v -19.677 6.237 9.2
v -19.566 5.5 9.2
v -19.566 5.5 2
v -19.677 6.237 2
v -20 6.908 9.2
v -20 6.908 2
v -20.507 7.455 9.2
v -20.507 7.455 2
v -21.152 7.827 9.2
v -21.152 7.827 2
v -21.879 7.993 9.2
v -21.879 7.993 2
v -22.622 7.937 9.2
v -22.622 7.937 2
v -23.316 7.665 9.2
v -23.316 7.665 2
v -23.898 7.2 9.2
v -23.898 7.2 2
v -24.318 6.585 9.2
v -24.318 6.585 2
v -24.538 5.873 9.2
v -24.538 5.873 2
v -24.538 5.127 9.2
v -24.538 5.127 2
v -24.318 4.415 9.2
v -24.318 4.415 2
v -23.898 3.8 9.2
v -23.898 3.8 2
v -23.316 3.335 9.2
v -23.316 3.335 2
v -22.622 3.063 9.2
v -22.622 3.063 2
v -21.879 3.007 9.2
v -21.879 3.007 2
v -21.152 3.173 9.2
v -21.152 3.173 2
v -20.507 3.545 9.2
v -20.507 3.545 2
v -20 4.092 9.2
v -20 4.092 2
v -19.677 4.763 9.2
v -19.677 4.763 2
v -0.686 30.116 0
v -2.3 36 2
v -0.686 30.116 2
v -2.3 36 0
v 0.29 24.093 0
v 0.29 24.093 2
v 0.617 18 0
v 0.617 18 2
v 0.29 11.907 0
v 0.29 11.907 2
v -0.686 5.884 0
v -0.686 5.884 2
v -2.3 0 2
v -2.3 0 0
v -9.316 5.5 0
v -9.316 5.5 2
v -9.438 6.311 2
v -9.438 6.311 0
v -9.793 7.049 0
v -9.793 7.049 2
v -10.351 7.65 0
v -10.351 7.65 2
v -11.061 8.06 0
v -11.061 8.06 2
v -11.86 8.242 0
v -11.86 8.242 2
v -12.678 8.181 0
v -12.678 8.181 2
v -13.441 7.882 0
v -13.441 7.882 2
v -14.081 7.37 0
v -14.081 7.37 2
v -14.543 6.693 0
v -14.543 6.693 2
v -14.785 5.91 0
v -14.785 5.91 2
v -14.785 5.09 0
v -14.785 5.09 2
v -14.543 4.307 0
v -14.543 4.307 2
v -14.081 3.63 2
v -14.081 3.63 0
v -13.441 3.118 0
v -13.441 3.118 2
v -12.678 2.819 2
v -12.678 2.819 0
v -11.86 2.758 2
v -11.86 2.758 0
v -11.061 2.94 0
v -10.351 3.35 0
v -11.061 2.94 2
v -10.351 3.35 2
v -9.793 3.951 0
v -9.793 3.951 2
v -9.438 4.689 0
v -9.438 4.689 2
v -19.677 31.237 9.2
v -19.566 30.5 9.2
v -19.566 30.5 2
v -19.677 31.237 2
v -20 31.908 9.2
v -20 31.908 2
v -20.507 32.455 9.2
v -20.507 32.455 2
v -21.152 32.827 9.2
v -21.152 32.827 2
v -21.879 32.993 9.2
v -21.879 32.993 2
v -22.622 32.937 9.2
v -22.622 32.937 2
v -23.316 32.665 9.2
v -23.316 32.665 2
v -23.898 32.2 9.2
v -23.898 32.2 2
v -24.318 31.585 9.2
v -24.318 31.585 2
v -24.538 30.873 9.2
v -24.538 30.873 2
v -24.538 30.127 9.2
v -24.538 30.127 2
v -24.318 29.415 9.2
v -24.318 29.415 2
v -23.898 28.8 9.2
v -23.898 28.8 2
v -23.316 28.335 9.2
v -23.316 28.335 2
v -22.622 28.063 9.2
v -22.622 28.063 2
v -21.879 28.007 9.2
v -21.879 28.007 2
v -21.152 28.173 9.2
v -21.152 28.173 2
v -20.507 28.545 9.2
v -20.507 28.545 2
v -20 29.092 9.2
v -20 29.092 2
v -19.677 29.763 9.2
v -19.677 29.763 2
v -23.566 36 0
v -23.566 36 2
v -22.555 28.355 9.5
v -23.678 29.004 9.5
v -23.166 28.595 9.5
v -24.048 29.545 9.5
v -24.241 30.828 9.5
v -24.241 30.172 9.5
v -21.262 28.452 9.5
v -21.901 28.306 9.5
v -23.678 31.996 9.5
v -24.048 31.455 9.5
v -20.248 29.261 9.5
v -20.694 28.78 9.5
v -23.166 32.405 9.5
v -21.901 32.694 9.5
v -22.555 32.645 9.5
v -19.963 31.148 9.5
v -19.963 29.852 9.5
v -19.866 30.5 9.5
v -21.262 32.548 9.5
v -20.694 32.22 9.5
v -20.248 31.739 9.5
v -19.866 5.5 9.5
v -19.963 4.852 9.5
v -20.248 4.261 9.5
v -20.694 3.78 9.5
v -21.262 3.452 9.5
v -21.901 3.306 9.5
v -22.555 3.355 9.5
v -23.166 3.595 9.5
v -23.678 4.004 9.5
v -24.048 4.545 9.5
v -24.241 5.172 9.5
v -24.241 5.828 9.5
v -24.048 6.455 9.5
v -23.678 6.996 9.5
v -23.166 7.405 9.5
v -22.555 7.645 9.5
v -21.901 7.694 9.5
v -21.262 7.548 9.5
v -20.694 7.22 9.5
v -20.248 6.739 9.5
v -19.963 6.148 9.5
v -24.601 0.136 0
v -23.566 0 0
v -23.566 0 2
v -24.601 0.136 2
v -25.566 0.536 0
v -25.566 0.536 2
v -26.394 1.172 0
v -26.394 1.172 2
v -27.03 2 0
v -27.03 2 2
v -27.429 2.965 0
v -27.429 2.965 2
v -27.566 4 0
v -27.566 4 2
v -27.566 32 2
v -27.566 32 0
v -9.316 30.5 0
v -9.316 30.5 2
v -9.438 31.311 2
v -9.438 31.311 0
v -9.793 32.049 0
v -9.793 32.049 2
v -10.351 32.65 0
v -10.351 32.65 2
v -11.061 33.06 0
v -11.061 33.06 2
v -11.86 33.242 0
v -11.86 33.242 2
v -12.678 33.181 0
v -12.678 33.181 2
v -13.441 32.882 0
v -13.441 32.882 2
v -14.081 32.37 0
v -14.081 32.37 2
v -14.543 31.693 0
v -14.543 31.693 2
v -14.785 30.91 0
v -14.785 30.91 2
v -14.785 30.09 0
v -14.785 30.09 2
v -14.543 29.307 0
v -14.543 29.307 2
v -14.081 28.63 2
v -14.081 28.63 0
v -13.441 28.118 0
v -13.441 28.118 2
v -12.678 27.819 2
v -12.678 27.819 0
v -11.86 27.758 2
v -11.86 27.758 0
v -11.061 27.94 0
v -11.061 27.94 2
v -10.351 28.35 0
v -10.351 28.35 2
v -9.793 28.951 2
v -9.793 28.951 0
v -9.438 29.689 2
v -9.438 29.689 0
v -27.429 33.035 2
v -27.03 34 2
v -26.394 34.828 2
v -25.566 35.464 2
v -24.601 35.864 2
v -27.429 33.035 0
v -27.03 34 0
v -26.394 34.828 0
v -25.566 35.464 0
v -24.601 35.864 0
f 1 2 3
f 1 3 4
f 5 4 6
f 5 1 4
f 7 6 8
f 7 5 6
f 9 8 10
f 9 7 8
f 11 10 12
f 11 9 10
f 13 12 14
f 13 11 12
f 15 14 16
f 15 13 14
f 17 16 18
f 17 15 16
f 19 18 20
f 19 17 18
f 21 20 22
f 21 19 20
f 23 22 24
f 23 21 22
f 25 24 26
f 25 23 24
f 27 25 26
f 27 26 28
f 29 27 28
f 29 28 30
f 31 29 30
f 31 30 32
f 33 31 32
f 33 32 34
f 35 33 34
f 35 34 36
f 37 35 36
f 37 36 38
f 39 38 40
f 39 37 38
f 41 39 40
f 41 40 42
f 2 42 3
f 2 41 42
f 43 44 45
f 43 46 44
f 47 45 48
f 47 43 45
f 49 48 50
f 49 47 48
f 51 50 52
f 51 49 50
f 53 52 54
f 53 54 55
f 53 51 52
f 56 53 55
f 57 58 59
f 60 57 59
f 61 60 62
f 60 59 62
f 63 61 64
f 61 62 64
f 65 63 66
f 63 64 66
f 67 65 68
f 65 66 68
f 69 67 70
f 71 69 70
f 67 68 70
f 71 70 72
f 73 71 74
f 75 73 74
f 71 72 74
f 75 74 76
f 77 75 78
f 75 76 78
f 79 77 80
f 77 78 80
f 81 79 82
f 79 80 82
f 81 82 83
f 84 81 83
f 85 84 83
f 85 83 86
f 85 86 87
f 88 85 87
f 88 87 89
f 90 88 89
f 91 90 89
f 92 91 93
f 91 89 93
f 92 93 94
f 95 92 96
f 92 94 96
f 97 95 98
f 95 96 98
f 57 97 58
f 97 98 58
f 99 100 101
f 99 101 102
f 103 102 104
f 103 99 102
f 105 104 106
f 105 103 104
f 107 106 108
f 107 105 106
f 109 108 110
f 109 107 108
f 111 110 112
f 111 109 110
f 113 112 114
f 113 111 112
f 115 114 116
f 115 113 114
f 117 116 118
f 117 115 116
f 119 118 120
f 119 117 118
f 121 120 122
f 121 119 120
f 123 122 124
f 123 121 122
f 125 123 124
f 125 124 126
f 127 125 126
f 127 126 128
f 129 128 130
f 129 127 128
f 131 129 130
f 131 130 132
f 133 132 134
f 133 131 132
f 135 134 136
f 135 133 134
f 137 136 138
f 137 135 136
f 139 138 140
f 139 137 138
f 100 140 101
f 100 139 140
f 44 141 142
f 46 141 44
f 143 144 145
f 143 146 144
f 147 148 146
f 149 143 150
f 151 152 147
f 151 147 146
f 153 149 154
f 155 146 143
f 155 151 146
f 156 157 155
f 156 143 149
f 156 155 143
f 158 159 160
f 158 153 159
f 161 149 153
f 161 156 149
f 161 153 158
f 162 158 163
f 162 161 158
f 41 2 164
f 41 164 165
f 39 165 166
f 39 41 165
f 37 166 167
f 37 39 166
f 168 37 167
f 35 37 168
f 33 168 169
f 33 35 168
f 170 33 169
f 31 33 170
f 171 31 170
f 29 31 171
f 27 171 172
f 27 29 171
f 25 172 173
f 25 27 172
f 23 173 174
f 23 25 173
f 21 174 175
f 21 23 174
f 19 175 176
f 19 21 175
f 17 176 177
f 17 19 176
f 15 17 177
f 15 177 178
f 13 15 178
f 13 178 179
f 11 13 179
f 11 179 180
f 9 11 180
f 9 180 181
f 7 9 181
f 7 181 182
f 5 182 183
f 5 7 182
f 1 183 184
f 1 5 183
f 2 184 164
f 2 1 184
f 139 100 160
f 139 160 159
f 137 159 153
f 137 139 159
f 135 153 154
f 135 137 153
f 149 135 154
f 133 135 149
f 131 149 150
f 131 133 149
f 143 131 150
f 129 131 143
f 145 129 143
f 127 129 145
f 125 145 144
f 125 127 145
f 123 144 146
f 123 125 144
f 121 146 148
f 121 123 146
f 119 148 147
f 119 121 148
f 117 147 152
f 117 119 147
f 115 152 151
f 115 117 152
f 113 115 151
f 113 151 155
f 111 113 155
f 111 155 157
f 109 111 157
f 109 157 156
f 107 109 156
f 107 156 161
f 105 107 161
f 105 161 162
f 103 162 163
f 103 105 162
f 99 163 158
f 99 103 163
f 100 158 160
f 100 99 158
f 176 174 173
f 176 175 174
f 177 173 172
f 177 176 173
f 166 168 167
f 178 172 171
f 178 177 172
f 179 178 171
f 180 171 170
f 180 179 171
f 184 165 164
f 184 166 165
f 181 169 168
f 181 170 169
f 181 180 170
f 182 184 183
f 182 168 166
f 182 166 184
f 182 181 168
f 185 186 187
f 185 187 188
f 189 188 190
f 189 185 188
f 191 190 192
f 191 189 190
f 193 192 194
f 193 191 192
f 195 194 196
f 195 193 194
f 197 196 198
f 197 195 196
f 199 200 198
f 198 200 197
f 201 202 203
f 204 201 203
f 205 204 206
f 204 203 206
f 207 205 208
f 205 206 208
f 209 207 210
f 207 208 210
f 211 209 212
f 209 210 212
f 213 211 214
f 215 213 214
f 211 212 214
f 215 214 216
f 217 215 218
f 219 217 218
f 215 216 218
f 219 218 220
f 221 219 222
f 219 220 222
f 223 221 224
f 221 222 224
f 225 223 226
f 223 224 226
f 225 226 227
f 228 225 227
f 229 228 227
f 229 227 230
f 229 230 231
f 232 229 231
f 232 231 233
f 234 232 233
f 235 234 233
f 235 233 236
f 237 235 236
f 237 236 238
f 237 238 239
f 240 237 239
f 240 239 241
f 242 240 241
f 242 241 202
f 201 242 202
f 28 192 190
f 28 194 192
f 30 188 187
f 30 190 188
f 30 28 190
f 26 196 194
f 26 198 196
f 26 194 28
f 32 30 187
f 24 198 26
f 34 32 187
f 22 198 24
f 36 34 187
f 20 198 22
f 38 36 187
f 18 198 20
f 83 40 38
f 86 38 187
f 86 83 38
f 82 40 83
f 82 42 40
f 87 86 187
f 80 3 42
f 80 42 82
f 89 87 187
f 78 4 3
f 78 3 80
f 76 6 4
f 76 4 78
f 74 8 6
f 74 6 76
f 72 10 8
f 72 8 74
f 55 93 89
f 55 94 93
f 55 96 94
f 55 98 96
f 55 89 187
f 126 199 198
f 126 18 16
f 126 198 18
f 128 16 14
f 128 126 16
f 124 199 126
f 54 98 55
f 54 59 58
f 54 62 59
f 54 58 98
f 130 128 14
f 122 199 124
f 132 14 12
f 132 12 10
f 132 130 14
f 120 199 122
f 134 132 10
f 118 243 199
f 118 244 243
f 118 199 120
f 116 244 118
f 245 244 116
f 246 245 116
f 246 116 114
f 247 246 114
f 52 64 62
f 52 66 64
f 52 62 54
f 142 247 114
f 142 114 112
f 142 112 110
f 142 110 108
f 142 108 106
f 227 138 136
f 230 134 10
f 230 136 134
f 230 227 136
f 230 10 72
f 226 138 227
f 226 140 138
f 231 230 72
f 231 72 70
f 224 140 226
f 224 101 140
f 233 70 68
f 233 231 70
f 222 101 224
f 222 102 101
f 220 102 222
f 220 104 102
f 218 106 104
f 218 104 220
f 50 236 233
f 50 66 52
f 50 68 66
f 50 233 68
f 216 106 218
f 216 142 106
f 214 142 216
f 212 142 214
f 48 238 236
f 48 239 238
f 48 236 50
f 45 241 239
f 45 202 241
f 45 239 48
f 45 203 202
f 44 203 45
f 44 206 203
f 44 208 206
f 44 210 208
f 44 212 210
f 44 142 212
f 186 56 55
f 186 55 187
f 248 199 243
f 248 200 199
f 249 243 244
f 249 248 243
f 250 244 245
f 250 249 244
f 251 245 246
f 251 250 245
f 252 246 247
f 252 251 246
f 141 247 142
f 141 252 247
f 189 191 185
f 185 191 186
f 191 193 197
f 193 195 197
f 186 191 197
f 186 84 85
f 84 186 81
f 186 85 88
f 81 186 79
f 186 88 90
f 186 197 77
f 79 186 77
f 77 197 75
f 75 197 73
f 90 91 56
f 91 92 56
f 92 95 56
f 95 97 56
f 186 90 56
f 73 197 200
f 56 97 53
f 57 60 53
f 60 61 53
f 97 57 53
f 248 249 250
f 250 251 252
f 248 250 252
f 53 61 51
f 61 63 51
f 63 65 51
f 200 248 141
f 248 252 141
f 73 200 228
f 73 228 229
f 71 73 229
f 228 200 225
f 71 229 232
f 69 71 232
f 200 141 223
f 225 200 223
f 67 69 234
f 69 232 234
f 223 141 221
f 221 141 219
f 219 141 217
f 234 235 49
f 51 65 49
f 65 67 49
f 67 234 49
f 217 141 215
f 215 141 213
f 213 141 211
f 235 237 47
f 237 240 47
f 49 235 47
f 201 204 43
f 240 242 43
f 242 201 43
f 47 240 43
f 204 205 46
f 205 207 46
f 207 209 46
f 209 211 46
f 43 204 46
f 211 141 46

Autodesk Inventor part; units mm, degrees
ref_plane "YZ Plane" through (0, 0, 0) normal (1, 0, 0) x (0, 1, 0)
ref_plane "XZ Plane" through (0, 0, 0) normal (0, 1, 0) x (-1, 0, 0)
ref_plane "XY Plane" through (0, 0, 0) normal (0, 0, 1) x (1, 0, 0)
sketch "Esquisse1" plane through (0, 0, 0) normal (0, 0, 1) x (1, 0, 0)
  line L0 (0, 0) -> (-29, 0)
  line L1 (-29, 0) -> (-29, 36)
  line L2 (-29, 36) -> (0, 36)
  line L3 (-24.5656, 33) -> (-19.5656, 33)
  line L4 (-19.5656, 33) -> (-19.5656, 28)
  line L5 (-19.5656, 28) -> (-24.5656, 28)
  line L6 (-24.5656, 28) -> (-24.5656, 33)
  line L7 (-14.5656, 33) -> (-9.5656, 33)
  line L8 (-9.5656, 33) -> (-9.5656, 28)
  line L9 (-9.5656, 28) -> (-14.5656, 28)
  line L10 (-14.5656, 28) -> (-14.5656, 33)
  line L11 (-24.5656, 8) -> (-19.5656, 8)
  line L12 (-19.5656, 8) -> (-19.5656, 3)
  line L13 (-19.5656, 3) -> (-24.5656, 3)
  line L14 (-24.5656, 3) -> (-24.5656, 8)
  line L15 (-14.5656, 8) -> (-9.5656, 8)
  line L16 (-9.5656, 8) -> (-9.5656, 3)
  line L17 (-9.5656, 3) -> (-14.5656, 3)
  line L18 (-14.5656, 3) -> (-14.5656, 8)
  arc A0 (0, 0) -> (0, 36) centre (-54.0833, 18) ccw
  line L19 (-9.3156, 33.25) -> (-14.8156, 33.25)
  line L20 (-14.8156, 33.25) -> (-14.8156, 27.75)
  line L21 (-14.8156, 27.75) -> (-9.3156, 27.75)
  line L22 (-9.3156, 27.75) -> (-9.3156, 33.25)
  line L23 (-9.3156, 8.25) -> (-14.8156, 8.25)
  line L24 (-14.8156, 8.25) -> (-14.8156, 2.75)
  line L25 (-14.8156, 2.75) -> (-9.3156, 2.75)
  line L26 (-9.3156, 2.75) -> (-9.3156, 8.25)
  dimension "d0" = 36
  dimension "d1" = 29
  dimension "d2" = 5
  dimension "d3" = 5
  dimension "d4" = 5
  dimension "d5" = 5
  dimension "d6" = 20
  dimension "d7" = 5
  dimension "d8" = 3
  dimension "d9" = 57
  dimension "d21" = 5.5
  dimension "d22" = 5.5
extrude "Extrusion1" add sketch "Esquisse1" along normal blind 2 contours L0 L1 L2 A0 | L22 L21 L20 L19 | L26 L25 L24 L23
extrude "Extrusion3" add sketch "Esquisse1" along normal blind 9.5 contours L3 L4 L5 L6 | L11 L12 L13 L14
fillet "Congé1" radius 4 2 edges at (-29, 0, 1) (-29, 36, 1)
sketch "Esquisse2" plane through (0, 0, 2) normal (0, 0, 1) x (1, 0, 0)
  line L0 (-9.5656, 8) -> (-9.5656, 3) projected
  line L1 (-9.5656, 3) -> (-14.5656, 3) projected
  line L2 (-14.5656, 3) -> (-14.5656, 8) projected
  line L3 (-14.5656, 8) -> (-9.5656, 8) projected
  line L4 (-19.5656, 8) -> (-19.5656, 3) projected
  line L5 (-19.5656, 3) -> (-24.5656, 3) projected
  line L6 (-24.5656, 3) -> (-24.5656, 8) projected
  line L7 (-24.5656, 8) -> (-19.5656, 8) projected
  line L8 (-9.5656, 33) -> (-9.5656, 28) projected
  line L9 (-9.5656, 28) -> (-14.5656, 28) projected
  line L10 (-14.5656, 28) -> (-14.5656, 33) projected
  line L11 (-14.5656, 33) -> (-9.5656, 33) projected
  line L12 (-19.5656, 33) -> (-19.5656, 28) projected
  line L13 (-19.5656, 28) -> (-24.5656, 28) projected
  line L14 (-24.5656, 28) -> (-24.5656, 33) projected
  line L15 (-24.5656, 33) -> (-19.5656, 33) projected
  arc A0 (-25, 36) -> (-29, 32) centre (-25, 32) ccw projected
  line L16 (-29, 32) -> (-29, 4) projected
  arc A1 (-29, 4) -> (-25, 0) centre (-25, 4) ccw projected
  line L17 (-25, 0) -> (0, 0) projected
  arc A2 (0, 0) -> (0, 36) centre (-54.0833, 18) ccw projected
  line L18 (0, 36) -> (-25, 36) projected
  circle A3 centre (-12.0656, 30.5) radius 2.5
  circle A4 centre (-12.0656, 5.5) radius 2.5
extrude "Extrusion4" add sketch "Esquisse2" against normal up to surface (2 mm away) contours L0 A4 L3 | L0 L1 A4 | A4 L2 L3 | L1 L2 A4 | L8 A3 L11 | L8 L9 A3 | A3 L10 L11 | L9 L10 A3
sketch "Esquisse3" plane through (0, 0, 9.5) normal (0, 0, 1) x (1, 0, 0)
  circle A0 centre (-12.0656, 5.5) radius 2.5 projected
  line L0 (-19.5656, 8) -> (-19.5656, 3) projected
  line L1 (-19.5656, 3) -> (-24.5656, 3) projected
  line L2 (-24.5656, 3) -> (-24.5656, 8) projected
  line L3 (-24.5656, 8) -> (-19.5656, 8) projected
  circle A1 centre (-12.0656, 30.5) radius 2.5 projected
  line L4 (-19.5656, 33) -> (-19.5656, 28) projected
  line L5 (-19.5656, 28) -> (-24.5656, 28) projected
  line L6 (-24.5656, 28) -> (-24.5656, 33) projected
  line L7 (-24.5656, 33) -> (-19.5656, 33) projected
  arc A2 (-25, 36) -> (-29, 32) centre (-25, 32) ccw projected
  line L8 (-29, 32) -> (-29, 4) projected
  arc A3 (-29, 4) -> (-25, 0) centre (-25, 4) ccw projected
  line L9 (-25, 0) -> (0, 0) projected
  arc A4 (0, 0) -> (0, 36) centre (-54.0833, 18) ccw projected
  line L10 (0, 36) -> (-25, 36) projected
  circle A5 centre (-22.0656, 30.5) radius 2.5
  circle A6 centre (-22.0656, 5.5) radius 2.5
extrude "Extrusion5" cut sketch "Esquisse3" against normal up to surface (7.5 mm away) contours L0 A6 L3 | L0 L1 A6 | A6 L2 L3 | L1 L2 A6 | L4 A5 L7 | L4 L5 A5 | A5 L6 L7 | L5 L6 A5
sketch "Esquisse4" plane through (0, 0, 2) normal (0, 0, 1) x (1, 0, 0)
  circle A0 centre (-12.0656, 5.5) radius 2.5 projected
  circle A1 centre (-22.0656, 5.5) radius 2.5 projected
  circle A2 centre (-12.0656, 30.5) radius 2.5 projected
  circle A3 centre (-22.0656, 30.5) radius 2.5 projected
  arc A4 (-25, 36) -> (-29, 32) centre (-25, 32) ccw projected
  line L0 (-29, 32) -> (-29, 4) projected
  arc A5 (-29, 4) -> (-25, 0) centre (-25, 4) ccw projected
  line L1 (-25, 0) -> (0, 0) projected
  arc A6 (0, 0) -> (0, 36) centre (-54.0833, 18) ccw projected
  line L2 (0, 36) -> (-25, 36) projected
  circle A7 centre (-12.0656, 30.5) radius 2.75
  circle A8 centre (-12.0656, 5.5) radius 2.75
  dimension "d23" = 5.5
  dimension "d24" = 5.5
extrude "Extrusion6" cut sketch "Esquisse4" against normal through all contours A7 | A8
chamfer "Chanfrein1" distance 0.3 angle 45 2 edges at (-24.5656, 5.5, 9.5) (-24.5656, 30.5, 9.5)
sketch "Esquisse5" plane through (0, 0, 0) normal (0, 0, -1) x (-1, 0, 0)
  circle A0 centre (34.0656, -7) radius 1.15 projected
  circle A1 centre (40.5656, -7) radius 1.15 projected
  circle A2 centre (70.5656, -7) radius 1.15 projected
  circle A3 centre (77.0656, -7) radius 1.15 projected
  circle A4 centre (45.5656, 14.75) radius 1.15 projected
  circle A5 centre (65.5656, 14.75) radius 1.15 projected
  circle A6 centre (65.5656, 21.25) radius 1.15 projected
  circle A7 centre (45.5656, 21.25) radius 1.15 projected
  circle A8 centre (77.0656, 43) radius 1.15 projected
  circle A9 centre (70.5656, 43) radius 1.15 projected
  circle A10 centre (40.5656, 43) radius 1.15 projected
  circle A11 centre (34.0656, 43) radius 1.15 projected
  line L0 (40.3656, 10.5) -> (40.3656, 0.5) projected
  line L1 (70.7477, 10.5) -> (40.3656, 10.5) projected
  line L2 (70.7477, 0.5) -> (70.7477, 10.5) projected
  line L3 (66.7656, 0.5) -> (70.7477, 0.5) projected
  line L4 (66.7656, 0.5) -> (66.7656, -12) projected
  line L5 (66.7656, -12) -> (82.5656, -12) projected
  arc A12 (82.5656, -12) -> (86.5656, -8) centre (82.5656, -8) ccw projected
  line L6 (86.5656, -8) -> (86.5656, 0) projected
  line L7 (86.5656, 0) -> (87.5656, 0) projected
  arc A13 (83.5656, 4) -> (87.5656, 0) centre (87.5656, 4) ccw projected
  line L8 (83.5656, 4) -> (83.5656, 9) projected
  arc A14 (87.5656, 13) -> (83.5656, 9) centre (87.5656, 9) ccw projected
  line L9 (87.5656, 13) -> (104.0656, 13) projected
  arc A15 (105.2725, 12.5947) -> (104.0656, 13) centre (104.0656, 11) ccw projected
  arc A16 (105.2725, 12.5947) -> (105.2725, 23.4053) centre (55.5656, 18) ccw projected
  arc A17 (104.0656, 23) -> (105.2725, 23.4053) centre (104.0656, 25) ccw projected
  line L10 (104.0656, 23) -> (87.5656, 23) projected
  arc A18 (83.5656, 27) -> (87.5656, 23) centre (87.5656, 27) ccw projected
  line L11 (83.5656, 27) -> (83.5656, 32) projected
  arc A19 (87.5656, 36) -> (83.5656, 32) centre (87.5656, 32) ccw projected
  line L12 (87.5656, 36) -> (86.5656, 36) projected
  line L13 (86.5656, 36) -> (86.5656, 44) projected
  arc A20 (86.5656, 44) -> (82.5656, 48) centre (82.5656, 44) ccw projected
  line L14 (82.5656, 48) -> (66.7656, 48) projected
  line L15 (66.7656, 48) -> (66.7656, 35.5) projected
  line L16 (70.7477, 35.5) -> (66.7656, 35.5) projected
  line L17 (70.7477, 25.5) -> (70.7477, 35.5) projected
  line L18 (40.3656, 25.5) -> (70.7477, 25.5) projected
  line L19 (40.3656, 35.5) -> (40.3656, 25.5) projected
  line L20 (44.3656, 35.5) -> (40.3656, 35.5) projected
  line L21 (44.3656, 35.5) -> (44.3656, 48) projected
  line L22 (44.3656, 48) -> (28.5656, 48) projected
  arc A21 (28.5656, 48) -> (24.5656, 44) centre (28.5656, 44) ccw projected
  line L23 (24.5656, 44) -> (24.5656, 36) projected
  line L24 (24.5656, 36) -> (23.5656, 36) projected
  arc A22 (27.5656, 32) -> (23.5656, 36) centre (23.5656, 32) ccw projected
  line L25 (27.5656, 32) -> (27.5656, 27) projected
  arc A23 (23.5656, 23) -> (27.5656, 27) centre (23.5656, 27) ccw projected
  line L26 (23.5656, 23) -> (7.0656, 23) projected
  arc A24 (5.8586, 23.4053) -> (7.0656, 23) centre (7.0656, 25) ccw projected
  arc A25 (5.8586, 23.4053) -> (5.8586, 12.5947) centre (55.5656, 18) ccw projected
  arc A26 (7.0656, 13) -> (5.8586, 12.5947) centre (7.0656, 11) ccw projected
  line L27 (7.0656, 13) -> (23.5656, 13) projected
  arc A27 (27.5656, 9) -> (23.5656, 13) centre (23.5656, 9) ccw projected
  line L28 (27.5656, 9) -> (27.5656, 4) projected
  arc A28 (23.5656, 0) -> (27.5656, 4) centre (23.5656, 4) ccw projected
  line L29 (23.5656, 0) -> (24.5656, 0) projected
  line L30 (24.5656, 0) -> (24.5656, -8) projected
  arc A29 (24.5656, -8) -> (28.5656, -12) centre (28.5656, -8) ccw projected
  line L31 (28.5656, -12) -> (44.3656, -12) projected
  line L32 (44.3656, -12) -> (44.3656, 0.5) projected
  line L33 (40.3656, 0.5) -> (44.3656, 0.5) projected
  line L34 (27.5656, 4) -> (27.5656, 32)
  arc A30 (23.5656, 0) -> (27.5656, 4) centre (23.5656, 4) ccw
  arc A31 (27.5656, 32) -> (23.5656, 36) centre (23.5656, 32) ccw
  line L35 (23.5656, 0) -> (2.3, 0)
  line L36 (25, 0) -> (0, 0) projected
  line L37 (23.5656, 36.0967) -> (2.3, 36)
  line L38 (25, 36) -> (0, 36) projected
  arc A32 (2.3, 36) -> (2.3, 0) centre (56.3833, 18) ccw
  arc A33 (0, 36) -> (0, 0) centre (54.0833, 18) ccw projected
  line L39 (29, 4) -> (29, 32) projected
  arc A34 (25, 0) -> (29, 4) centre (25, 4) ccw projected
  arc A35 (29, 32) -> (25, 36) centre (25, 32) ccw projected
  line L40 (0, 0) -> (25, 0) projected
  dimension "d30" = 2.3
  dimension "d31" = 2.3
  dimension "d32" = 57
  dimension "d33" = 57
extrude "Extrusion7" cut sketch "Esquisse5" against normal through all contours L29 A28 L28 L34 L25 A22 L24 L38 A35 L39 A34 L36 | L36 A33 L38 A32
properties part number "green_part-july21" material "Plastique ABS"
